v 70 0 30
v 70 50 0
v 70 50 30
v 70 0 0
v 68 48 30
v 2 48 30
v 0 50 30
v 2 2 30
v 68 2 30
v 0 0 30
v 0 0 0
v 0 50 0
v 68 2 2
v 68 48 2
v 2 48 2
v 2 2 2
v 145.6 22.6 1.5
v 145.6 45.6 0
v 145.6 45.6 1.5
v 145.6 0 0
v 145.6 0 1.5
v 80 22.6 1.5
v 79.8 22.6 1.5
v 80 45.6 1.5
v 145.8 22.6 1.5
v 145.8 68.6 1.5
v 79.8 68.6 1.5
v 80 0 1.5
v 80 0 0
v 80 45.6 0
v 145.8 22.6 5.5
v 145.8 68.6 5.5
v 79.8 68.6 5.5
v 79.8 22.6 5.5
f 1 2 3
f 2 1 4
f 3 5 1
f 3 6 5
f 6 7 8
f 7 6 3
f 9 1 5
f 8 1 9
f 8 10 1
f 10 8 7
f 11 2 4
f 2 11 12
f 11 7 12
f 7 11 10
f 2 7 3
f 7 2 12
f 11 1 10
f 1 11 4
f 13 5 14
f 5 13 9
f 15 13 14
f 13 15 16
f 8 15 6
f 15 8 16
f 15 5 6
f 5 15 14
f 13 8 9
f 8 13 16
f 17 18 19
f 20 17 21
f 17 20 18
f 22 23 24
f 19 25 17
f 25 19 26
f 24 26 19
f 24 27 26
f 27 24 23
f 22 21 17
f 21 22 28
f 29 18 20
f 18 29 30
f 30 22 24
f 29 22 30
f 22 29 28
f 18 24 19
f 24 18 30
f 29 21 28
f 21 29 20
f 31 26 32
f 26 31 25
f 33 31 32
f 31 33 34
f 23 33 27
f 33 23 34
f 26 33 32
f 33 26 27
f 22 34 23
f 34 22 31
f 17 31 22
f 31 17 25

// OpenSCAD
// Two-part enclosure for small electronics board
// Print orientation: box on bed (z = 0), lid on +X side, printed upside down

// ---------- Parameters ----------
box_x      = 70;    // box outer length (X)
box_y      = 50;    // box outer width (Y)
box_z      = 30;    // box outer height (Z)
box_wall   = 2;     // box wall thickness
box_floor  = 2;     // box floor thickness

gap        = 10;    // gap between box and lid

lip_wall   = 1.5;   // lid lip wall thickness
lip_h      = 4;     // lid lip height
lip_x      = 65.6;  // lid lip outer length (X)
lip_y      = 45.6;  // lid lip outer width (Y)
lip_over   = 0.2;   // lip overhang past box opening (each side)

eps        = 0.5;   // cutter overshoot past faces

$fn = 64;

// ---------- Derived ----------
box_inner_x = box_x - 2 * box_wall;
box_inner_y = box_y - 2 * box_wall;
box_inner_z = box_z - box_floor;   // open-top cavity height

// ---------- Model ----------
union() {
    // Box
    difference() {
        cube([box_x, box_y, box_z]);
        translate([box_wall, box_wall, box_floor])
            cube([box_inner_x, box_inner_y, box_inner_z + 0.01]); // closed top for clean cut
    }

    // Lid (printed upside down: plate on bed, lip on top)
    union() {
        // Plate
        translate([box_x + gap, 0, 0])
            cube([lip_x, lip_y, lip_wall]);

        // Lip, overlapping the plate for a solid union
        translate([box_x + gap - lip_over,
                   lip_y / 2 - lip_over,
                   lip_wall])
            cube([lip_x + 2 * lip_over,
                  lip_y + 2 * lip_over,
                  lip_h]);
    }
}
